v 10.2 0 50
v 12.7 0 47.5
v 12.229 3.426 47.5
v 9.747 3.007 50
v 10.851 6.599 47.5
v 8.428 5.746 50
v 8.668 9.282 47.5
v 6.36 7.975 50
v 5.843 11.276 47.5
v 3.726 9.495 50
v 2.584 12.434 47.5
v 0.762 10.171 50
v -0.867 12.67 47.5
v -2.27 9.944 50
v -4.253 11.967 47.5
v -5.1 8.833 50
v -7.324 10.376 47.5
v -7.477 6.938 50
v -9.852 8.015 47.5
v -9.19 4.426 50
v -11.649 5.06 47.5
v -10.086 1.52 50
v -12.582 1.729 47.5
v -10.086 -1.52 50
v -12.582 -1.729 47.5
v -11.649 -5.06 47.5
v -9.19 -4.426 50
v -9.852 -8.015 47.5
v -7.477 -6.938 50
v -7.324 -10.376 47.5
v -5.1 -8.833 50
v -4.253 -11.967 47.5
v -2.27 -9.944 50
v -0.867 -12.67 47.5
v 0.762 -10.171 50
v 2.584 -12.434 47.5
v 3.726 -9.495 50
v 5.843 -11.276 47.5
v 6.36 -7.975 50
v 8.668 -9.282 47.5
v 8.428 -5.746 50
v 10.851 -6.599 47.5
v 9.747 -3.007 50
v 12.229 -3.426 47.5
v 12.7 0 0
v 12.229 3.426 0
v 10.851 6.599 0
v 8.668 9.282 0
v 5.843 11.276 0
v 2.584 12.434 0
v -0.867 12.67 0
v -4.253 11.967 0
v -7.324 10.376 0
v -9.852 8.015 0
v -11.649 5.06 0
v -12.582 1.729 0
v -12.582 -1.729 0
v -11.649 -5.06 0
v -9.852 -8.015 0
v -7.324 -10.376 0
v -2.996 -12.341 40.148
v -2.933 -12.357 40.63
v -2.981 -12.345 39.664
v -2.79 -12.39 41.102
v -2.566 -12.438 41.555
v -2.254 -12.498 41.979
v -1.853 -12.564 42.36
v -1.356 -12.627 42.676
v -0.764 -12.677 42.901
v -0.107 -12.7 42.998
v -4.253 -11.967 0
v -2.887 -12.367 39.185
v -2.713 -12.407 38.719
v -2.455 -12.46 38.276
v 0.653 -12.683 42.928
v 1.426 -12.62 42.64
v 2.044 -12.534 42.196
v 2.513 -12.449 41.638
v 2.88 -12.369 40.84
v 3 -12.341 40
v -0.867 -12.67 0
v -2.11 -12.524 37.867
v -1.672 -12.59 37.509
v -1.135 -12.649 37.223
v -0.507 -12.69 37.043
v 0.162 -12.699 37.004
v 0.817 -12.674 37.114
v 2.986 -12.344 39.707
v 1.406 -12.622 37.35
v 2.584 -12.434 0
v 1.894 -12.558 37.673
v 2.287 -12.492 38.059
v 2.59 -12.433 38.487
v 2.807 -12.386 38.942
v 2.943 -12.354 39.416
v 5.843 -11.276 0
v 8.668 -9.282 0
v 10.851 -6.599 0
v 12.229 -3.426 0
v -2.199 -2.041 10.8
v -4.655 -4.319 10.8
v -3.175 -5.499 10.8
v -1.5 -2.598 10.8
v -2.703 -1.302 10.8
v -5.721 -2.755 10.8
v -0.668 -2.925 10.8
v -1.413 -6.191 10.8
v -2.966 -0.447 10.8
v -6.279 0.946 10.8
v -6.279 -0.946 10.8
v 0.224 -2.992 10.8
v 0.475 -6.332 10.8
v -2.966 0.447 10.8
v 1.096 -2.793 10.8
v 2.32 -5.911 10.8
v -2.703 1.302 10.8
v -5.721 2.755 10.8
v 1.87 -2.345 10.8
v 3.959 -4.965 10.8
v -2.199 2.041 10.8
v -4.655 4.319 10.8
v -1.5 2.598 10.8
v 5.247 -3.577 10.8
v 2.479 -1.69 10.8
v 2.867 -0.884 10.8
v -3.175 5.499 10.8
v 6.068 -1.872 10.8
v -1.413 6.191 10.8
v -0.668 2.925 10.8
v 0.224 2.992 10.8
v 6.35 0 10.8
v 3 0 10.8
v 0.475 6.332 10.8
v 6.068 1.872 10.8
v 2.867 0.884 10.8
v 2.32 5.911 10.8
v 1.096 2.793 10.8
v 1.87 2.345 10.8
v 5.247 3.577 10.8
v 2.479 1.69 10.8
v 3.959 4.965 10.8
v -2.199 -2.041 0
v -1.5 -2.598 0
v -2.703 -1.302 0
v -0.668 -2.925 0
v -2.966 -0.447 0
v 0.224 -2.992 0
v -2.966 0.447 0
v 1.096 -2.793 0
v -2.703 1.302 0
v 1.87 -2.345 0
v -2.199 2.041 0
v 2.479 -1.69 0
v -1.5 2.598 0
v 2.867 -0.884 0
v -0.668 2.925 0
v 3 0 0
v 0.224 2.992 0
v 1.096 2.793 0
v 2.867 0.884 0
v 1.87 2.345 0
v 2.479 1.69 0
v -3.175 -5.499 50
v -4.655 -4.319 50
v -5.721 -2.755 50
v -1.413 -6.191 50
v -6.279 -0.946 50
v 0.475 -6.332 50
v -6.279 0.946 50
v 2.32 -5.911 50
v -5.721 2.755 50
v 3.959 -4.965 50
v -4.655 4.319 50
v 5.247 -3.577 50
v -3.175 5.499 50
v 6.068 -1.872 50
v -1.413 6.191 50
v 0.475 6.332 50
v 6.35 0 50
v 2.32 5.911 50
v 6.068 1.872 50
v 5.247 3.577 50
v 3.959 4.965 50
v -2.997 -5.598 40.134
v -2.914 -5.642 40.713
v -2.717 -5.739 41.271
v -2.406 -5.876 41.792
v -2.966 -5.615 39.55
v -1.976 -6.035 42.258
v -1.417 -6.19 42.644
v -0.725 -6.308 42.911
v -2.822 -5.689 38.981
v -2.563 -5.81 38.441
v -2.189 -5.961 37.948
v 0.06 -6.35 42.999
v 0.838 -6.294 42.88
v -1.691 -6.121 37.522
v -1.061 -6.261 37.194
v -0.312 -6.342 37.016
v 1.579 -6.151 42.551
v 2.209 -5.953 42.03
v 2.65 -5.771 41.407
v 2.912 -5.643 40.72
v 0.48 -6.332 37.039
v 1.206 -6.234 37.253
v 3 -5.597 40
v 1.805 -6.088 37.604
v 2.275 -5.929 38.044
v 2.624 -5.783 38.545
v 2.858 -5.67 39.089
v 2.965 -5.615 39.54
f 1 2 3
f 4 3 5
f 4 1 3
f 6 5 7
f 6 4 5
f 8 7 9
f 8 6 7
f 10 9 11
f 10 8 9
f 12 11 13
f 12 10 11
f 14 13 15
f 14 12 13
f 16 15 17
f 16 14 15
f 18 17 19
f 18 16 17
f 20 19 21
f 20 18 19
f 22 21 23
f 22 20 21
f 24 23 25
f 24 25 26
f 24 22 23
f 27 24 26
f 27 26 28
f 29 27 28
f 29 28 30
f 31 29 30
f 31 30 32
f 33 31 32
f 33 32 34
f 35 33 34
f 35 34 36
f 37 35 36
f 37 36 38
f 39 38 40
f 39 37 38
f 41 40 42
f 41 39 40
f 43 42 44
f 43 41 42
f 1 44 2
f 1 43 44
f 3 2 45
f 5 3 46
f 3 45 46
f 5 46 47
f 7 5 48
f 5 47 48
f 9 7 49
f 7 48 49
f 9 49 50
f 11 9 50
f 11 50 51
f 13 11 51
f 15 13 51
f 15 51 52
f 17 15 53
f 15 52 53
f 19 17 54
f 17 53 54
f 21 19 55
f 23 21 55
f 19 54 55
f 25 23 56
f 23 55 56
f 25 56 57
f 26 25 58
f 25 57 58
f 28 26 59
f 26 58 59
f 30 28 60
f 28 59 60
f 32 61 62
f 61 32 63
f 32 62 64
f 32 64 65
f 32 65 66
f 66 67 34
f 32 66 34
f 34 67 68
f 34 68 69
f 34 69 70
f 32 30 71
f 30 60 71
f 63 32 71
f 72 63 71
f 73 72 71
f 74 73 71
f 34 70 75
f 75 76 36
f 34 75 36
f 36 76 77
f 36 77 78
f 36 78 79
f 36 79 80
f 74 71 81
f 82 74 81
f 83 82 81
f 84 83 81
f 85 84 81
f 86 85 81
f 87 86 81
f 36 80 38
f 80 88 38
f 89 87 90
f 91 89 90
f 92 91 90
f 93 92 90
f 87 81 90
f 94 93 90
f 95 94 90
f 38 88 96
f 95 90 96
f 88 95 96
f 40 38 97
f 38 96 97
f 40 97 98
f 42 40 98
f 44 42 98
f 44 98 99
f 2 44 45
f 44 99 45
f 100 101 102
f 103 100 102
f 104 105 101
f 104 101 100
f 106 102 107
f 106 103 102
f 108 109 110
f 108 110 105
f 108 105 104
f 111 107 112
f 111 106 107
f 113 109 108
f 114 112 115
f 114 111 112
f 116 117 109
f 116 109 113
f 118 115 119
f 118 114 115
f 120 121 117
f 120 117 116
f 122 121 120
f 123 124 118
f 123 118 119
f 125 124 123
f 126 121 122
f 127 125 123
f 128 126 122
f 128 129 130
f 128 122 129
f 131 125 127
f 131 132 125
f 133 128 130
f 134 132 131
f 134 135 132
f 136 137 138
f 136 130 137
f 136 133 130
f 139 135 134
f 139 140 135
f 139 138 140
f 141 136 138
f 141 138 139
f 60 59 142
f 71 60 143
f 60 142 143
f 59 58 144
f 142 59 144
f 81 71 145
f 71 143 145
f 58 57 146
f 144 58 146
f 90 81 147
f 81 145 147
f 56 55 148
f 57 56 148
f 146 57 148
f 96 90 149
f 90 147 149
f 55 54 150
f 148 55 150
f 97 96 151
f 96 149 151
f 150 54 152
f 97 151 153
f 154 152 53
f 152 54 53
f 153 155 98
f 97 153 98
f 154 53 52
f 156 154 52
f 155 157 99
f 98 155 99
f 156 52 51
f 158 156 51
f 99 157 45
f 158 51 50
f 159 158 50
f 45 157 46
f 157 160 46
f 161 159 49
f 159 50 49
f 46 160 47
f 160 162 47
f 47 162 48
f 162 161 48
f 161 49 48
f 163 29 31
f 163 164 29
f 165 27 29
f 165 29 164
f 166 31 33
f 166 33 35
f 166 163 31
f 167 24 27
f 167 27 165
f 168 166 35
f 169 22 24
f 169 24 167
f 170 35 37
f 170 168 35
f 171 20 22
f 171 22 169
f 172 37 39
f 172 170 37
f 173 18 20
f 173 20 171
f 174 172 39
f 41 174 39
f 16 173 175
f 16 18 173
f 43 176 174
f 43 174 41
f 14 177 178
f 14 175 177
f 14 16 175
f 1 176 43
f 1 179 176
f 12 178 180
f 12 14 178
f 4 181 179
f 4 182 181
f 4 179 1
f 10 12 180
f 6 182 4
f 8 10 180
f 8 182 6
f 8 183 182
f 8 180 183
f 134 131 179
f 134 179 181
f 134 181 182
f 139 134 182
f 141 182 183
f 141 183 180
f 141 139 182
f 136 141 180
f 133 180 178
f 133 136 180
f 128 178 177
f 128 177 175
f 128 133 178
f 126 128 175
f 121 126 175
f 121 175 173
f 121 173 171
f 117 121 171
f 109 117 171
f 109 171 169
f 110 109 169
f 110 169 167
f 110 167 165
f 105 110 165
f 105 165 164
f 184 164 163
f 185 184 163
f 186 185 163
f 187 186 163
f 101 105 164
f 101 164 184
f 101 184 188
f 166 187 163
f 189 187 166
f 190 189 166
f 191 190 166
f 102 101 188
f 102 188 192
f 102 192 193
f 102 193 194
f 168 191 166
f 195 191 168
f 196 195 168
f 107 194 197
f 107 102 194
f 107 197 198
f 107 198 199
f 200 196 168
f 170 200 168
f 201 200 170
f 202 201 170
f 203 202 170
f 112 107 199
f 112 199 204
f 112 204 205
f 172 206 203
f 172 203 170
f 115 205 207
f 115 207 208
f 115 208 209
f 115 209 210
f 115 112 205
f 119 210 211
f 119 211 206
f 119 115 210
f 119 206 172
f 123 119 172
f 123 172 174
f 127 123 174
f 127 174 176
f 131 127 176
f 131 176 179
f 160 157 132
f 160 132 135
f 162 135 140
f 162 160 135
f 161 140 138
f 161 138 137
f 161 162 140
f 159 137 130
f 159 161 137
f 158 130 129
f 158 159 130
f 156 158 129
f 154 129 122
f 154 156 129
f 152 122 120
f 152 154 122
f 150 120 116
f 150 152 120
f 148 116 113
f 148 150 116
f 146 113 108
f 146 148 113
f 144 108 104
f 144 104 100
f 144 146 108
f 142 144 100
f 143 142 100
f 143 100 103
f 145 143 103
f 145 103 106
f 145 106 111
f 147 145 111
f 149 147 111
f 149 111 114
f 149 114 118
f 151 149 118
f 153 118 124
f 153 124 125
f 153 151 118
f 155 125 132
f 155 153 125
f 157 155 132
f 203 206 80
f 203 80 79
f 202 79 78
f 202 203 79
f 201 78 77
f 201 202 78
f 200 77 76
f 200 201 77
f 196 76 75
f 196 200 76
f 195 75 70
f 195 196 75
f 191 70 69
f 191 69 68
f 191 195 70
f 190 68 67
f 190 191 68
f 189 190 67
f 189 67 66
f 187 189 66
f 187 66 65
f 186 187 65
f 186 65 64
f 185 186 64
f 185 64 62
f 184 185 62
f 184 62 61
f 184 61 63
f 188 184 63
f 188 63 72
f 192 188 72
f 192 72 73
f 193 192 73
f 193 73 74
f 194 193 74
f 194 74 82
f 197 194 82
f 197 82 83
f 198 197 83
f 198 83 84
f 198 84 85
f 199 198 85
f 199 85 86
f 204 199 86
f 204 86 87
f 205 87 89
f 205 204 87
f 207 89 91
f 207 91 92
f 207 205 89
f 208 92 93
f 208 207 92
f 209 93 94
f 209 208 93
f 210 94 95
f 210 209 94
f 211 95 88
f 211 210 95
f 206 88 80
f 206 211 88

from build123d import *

# Parameters (mm, degrees)
F0_R     = 12.7
F0_R_2   = 6.35
F1_DEPTH = 50
F0_R_3   = 3
F2_DEPTH = 10.8
F3_SIZE  = 2.5
F4_R     = 3
F5_DEPTH = 25


with BuildPart() as f1:
    # F0 (on Top) → F1 (new body)
    with BuildSketch(Plane.XY):
        Circle(F0_R)
        Circle(F0_R_2, mode=Mode.SUBTRACT)
    extrude(amount=F1_DEPTH)

    # F0 (on Top) → F2 (join)
    with BuildSketch(Plane.XY):
        Circle(F0_R_2)
        Circle(F0_R_3, mode=Mode.SUBTRACT)
    extrude(amount=F2_DEPTH)

    # F3
    f3_edges = [f1.edges().sort_by_distance(p)[0] for p in [
        (-12.7, 0, 50),
    ]]
    chamfer(f3_edges, length=F3_SIZE)

    # F4 (on Front) → F5 (cut)
    with BuildSketch(Plane.XZ):
        with Locations((0, 40)):
            Circle(F4_R)
    extrude(amount=F5_DEPTH, mode=Mode.SUBTRACT)


solid = f1.part
